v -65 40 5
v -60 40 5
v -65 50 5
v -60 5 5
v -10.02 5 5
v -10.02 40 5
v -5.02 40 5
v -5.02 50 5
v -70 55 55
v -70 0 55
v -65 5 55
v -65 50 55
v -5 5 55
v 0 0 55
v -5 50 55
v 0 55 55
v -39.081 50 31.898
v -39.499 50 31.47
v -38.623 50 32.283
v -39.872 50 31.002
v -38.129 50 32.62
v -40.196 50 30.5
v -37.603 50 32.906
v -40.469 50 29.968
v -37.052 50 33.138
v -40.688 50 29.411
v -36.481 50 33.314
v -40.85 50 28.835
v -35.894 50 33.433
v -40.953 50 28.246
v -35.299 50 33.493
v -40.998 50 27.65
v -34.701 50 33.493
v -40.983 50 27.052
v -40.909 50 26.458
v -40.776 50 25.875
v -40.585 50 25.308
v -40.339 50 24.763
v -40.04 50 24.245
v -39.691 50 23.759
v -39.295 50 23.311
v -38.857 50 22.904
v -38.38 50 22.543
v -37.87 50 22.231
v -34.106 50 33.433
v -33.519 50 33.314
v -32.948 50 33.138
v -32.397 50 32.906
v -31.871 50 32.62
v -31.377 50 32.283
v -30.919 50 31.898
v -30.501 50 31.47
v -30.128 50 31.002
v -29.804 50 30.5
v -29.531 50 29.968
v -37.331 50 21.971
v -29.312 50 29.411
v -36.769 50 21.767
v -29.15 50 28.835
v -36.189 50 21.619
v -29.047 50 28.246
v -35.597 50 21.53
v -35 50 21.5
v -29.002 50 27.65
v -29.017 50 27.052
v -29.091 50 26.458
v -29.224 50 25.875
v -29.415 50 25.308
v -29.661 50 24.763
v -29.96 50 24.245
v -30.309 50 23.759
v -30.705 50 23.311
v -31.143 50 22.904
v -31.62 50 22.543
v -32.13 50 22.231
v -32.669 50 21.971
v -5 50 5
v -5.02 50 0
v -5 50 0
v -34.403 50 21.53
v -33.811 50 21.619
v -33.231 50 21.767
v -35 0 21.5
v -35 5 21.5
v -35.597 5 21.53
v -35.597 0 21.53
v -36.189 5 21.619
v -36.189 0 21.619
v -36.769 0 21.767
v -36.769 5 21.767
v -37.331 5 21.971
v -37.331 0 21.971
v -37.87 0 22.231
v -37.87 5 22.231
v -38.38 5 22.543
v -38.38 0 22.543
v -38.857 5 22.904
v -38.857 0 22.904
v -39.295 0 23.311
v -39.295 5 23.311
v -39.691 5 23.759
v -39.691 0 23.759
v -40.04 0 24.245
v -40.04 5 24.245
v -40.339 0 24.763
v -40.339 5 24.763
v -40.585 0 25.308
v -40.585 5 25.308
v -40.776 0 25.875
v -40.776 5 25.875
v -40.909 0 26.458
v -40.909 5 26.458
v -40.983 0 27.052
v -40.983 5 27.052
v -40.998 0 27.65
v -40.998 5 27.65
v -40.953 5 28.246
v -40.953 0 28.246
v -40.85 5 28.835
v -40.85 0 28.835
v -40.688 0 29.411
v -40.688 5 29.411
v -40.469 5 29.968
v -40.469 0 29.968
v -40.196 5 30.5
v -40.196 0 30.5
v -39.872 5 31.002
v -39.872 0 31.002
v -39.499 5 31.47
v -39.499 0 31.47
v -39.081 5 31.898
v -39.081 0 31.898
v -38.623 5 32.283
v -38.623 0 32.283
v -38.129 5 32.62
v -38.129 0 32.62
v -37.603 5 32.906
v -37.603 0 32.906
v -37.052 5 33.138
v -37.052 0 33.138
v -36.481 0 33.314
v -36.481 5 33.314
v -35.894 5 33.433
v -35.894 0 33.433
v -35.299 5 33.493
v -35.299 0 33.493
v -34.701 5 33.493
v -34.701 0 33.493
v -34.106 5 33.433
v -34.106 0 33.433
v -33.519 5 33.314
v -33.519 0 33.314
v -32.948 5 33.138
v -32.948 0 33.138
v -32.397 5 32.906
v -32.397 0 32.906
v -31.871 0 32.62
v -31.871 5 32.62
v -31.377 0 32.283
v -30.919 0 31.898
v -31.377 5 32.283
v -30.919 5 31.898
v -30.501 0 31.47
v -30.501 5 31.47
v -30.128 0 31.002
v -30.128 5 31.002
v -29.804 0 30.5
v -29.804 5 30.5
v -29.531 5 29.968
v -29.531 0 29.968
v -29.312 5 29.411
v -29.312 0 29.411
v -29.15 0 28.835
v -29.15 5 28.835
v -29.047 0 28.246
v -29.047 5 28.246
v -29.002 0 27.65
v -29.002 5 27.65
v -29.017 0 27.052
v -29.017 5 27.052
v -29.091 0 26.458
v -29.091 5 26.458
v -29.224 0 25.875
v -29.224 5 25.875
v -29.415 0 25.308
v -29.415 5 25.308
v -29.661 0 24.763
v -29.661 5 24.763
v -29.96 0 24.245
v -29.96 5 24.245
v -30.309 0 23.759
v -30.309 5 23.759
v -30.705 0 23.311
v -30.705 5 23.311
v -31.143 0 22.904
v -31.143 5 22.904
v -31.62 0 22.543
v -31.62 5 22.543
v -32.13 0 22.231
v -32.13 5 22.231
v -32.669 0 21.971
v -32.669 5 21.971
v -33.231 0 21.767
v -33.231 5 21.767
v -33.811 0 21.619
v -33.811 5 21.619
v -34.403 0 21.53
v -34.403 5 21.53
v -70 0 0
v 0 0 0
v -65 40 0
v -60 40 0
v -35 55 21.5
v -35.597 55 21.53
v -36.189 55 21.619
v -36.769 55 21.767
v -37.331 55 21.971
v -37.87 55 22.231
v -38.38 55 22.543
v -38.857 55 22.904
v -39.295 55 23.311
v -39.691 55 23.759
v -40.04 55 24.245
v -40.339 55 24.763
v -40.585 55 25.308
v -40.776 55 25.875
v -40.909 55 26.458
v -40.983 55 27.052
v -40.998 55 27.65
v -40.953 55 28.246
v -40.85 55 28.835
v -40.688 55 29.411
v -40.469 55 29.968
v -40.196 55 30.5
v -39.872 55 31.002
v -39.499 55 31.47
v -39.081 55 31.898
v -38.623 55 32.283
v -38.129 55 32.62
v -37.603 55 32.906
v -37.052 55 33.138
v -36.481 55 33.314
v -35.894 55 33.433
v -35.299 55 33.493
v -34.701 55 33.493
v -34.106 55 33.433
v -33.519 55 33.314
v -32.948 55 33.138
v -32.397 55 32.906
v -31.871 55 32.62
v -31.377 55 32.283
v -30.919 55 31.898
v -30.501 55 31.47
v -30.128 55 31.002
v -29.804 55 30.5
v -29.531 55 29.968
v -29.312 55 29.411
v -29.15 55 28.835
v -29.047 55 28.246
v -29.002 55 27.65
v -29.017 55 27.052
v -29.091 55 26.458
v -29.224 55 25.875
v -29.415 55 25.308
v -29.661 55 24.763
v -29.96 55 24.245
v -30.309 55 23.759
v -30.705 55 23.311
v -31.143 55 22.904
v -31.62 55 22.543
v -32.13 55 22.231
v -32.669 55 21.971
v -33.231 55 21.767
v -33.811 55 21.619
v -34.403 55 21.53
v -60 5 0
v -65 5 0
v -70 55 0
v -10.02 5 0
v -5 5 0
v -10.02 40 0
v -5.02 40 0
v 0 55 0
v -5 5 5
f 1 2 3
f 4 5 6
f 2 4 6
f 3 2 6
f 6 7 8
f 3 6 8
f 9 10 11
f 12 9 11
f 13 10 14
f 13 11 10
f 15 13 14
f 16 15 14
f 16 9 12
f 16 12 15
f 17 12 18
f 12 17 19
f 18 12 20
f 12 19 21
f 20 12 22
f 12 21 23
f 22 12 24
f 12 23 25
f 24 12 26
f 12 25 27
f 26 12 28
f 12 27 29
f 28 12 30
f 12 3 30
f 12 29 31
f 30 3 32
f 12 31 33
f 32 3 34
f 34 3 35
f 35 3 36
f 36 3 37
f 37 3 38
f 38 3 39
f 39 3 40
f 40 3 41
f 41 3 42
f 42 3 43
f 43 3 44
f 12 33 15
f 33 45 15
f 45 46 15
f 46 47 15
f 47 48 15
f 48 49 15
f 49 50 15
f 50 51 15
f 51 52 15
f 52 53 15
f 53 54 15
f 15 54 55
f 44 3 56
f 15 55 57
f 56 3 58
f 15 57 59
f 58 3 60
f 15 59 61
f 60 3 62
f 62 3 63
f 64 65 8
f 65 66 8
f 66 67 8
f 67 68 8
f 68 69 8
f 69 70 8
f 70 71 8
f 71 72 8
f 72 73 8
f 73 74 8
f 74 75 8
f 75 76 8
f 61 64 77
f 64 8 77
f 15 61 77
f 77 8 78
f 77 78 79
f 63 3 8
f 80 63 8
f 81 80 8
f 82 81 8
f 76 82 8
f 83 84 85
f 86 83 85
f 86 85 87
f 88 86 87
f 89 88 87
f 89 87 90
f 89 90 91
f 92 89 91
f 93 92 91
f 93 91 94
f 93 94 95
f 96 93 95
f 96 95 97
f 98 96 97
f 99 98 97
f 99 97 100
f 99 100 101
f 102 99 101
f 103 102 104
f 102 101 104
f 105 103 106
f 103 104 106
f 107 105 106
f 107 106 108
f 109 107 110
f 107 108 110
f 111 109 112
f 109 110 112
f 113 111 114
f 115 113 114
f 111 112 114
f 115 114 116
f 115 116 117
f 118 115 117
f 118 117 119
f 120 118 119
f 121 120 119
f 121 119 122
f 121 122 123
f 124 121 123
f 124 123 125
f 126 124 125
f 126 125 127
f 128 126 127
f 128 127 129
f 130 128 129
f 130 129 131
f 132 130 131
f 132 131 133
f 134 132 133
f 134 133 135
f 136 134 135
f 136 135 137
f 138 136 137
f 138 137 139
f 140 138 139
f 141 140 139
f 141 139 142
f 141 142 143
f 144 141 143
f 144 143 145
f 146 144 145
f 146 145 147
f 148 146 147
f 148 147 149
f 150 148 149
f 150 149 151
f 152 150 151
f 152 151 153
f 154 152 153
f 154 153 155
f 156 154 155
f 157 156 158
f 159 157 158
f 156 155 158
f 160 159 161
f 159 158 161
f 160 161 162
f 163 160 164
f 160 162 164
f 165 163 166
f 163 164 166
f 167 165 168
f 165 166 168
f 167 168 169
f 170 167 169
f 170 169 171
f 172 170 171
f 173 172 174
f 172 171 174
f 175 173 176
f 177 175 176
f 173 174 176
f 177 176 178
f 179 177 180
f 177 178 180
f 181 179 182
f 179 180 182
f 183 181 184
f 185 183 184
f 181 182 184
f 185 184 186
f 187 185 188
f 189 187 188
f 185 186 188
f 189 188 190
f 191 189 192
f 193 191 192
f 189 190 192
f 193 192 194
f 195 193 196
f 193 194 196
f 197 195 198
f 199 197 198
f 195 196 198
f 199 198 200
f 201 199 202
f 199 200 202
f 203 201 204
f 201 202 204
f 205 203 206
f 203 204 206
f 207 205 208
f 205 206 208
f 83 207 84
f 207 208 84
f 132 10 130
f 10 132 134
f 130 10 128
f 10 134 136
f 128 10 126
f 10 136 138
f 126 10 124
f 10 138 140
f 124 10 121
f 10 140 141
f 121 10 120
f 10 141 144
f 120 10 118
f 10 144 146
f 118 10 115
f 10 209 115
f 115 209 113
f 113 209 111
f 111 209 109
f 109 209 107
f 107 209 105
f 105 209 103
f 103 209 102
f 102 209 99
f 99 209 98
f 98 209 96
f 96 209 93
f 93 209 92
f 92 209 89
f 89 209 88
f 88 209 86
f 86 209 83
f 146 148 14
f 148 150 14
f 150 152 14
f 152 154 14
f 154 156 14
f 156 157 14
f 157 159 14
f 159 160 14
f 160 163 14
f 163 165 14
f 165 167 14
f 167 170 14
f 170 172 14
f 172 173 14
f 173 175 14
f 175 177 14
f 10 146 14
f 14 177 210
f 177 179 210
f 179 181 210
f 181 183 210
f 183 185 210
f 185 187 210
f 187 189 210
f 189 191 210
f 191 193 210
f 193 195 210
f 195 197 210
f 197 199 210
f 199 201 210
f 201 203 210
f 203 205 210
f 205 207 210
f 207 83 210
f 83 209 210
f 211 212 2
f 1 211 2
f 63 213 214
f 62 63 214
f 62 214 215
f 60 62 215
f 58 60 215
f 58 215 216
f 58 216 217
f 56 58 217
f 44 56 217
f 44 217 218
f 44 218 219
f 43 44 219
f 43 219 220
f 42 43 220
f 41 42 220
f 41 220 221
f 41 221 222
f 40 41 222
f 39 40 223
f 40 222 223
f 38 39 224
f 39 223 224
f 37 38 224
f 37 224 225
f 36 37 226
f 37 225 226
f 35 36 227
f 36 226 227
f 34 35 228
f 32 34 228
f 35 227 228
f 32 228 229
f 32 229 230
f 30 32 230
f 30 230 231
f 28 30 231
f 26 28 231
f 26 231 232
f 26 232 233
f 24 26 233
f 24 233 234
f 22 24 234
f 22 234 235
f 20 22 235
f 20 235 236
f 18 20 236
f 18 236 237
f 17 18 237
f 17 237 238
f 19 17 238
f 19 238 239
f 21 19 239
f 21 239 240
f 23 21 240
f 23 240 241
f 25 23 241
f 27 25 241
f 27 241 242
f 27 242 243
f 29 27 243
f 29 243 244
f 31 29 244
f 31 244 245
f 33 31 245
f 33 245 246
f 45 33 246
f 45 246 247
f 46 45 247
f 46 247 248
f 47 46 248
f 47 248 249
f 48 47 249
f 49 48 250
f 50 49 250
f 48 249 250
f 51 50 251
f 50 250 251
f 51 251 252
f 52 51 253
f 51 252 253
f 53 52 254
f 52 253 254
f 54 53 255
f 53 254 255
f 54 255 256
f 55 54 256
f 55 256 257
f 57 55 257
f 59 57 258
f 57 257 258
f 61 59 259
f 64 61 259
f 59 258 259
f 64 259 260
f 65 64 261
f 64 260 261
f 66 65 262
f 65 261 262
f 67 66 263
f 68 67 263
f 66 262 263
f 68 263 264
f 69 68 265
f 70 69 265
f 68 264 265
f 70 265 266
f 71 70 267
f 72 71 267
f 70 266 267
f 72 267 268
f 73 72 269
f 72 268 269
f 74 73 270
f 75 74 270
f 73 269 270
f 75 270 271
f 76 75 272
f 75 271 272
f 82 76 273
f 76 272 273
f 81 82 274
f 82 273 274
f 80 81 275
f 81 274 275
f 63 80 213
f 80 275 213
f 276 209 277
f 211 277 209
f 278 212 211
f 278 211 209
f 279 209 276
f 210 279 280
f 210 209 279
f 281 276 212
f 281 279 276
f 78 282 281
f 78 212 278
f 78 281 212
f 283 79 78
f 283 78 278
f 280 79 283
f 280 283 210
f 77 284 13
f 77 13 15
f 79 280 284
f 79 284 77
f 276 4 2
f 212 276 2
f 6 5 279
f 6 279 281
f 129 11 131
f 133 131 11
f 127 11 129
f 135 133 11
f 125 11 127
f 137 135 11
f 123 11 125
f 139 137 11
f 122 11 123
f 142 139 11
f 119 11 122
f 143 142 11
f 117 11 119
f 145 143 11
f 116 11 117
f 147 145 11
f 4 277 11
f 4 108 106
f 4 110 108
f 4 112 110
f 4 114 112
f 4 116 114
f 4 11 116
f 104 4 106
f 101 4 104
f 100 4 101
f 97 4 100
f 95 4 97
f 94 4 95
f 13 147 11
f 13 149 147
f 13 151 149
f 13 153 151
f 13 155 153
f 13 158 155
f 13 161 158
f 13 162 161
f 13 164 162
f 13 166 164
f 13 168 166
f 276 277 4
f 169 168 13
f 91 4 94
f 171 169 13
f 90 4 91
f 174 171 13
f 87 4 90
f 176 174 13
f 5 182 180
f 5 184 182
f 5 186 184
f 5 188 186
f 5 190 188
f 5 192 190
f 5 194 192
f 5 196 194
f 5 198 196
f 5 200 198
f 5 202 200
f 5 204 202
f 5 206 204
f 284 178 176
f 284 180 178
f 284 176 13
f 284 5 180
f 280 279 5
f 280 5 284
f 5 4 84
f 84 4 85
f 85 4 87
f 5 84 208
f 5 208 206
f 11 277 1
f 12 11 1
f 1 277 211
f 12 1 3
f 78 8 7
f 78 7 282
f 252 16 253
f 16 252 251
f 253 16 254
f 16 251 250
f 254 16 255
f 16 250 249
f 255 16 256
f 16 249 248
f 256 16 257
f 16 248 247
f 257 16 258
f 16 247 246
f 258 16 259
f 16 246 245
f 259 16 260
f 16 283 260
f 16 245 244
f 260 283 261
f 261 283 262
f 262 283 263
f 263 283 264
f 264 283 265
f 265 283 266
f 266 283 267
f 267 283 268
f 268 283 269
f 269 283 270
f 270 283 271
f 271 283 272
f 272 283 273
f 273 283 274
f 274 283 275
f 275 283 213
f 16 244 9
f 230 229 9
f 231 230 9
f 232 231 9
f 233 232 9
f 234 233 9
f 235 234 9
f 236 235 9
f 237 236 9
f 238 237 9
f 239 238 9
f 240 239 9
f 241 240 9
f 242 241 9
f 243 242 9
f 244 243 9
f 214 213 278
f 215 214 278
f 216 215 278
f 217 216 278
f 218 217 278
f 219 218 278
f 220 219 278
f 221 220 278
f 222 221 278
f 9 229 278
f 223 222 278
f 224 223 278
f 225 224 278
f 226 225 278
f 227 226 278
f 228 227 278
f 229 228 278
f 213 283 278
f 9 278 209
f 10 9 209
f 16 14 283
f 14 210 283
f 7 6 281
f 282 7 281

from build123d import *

# Parameters (mm, degrees)
SKETCH1_W           = 70
SKETCH1_H           = 55
BOSS_EXTRUDE1_DEPTH = 5
SKETCH2_W           = 5
SKETCH2_H           = 45
SKETCH2_W_2         = 5.019591865
CUT_EXTRUDE1_DEPTH  = 5
SKETCH6_W           = 60
SKETCH6_H           = 45
BOSS_EXTRUDE4_DEPTH = 50
SKETCH7_R           = 6
CUT_EXTRUDE2_DEPTH  = 70
SKETCH8_W           = 5
SKETCH8_H           = 10
BOSS_EXTRUDE5_DEPTH = 5
SKETCH9_W           = 5
SKETCH9_H           = 10
BOSS_EXTRUDE6_DEPTH = 5


with BuildPart() as part:
    # Sketch1 → Boss-Extrude1 (new body)
    with BuildSketch(Plane.XY):
        with Locations((-35, 27.5)):
            Rectangle(SKETCH1_W, SKETCH1_H)
    extrude(amount=BOSS_EXTRUDE1_DEPTH)

    # Sketch2 → Cut-Extrude1 (cut)
    with BuildSketch(Plane.XY.offset(5)):
        with Locations((-62.5, 27.5)):
            Rectangle(SKETCH2_W, SKETCH2_H)
        with Locations((-7.509795933, 27.5)):
            Rectangle(SKETCH2_W_2, SKETCH2_H)
    extrude(amount=-CUT_EXTRUDE1_DEPTH, mode=Mode.SUBTRACT)

    # Sketch6 → Boss-Extrude4 (add)
    with BuildSketch(Plane.XY.offset(5)):
        Polygon((-70, 0), (-65, 0), (-5, 0), (0, 0), (0, 55), (-5, 55), (-65, 55), (-70, 55), align=None)
        with Locations((-35, 27.5)):
            Rectangle(SKETCH6_W, SKETCH6_H, mode=Mode.SUBTRACT)
    extrude(amount=BOSS_EXTRUDE4_DEPTH)

    # Sketch7 → Cut-Extrude2 (cut)
    with BuildSketch(Plane(origin=(0, 55, 0), x_dir=(1, 0, 0), z_dir=(0, 1, 0))):
        with Locations(Location((-35, -27.5, 0), (0, 0, 90))):
            Circle(SKETCH7_R)
    extrude(amount=-CUT_EXTRUDE2_DEPTH, mode=Mode.SUBTRACT)

    # Sketch8 → Boss-Extrude5 (add)
    with BuildSketch(Plane(origin=(-10.019591865, 0, 0), x_dir=(0, 0, -1), z_dir=(1, 0, 0))):
        with Locations((-2.5, 45)):
            Rectangle(SKETCH8_W, SKETCH8_H)
    extrude(amount=BOSS_EXTRUDE5_DEPTH)

    # Sketch9 → Boss-Extrude6 (add)
    with BuildSketch(Plane.ZY.offset(60)):
        with Locations((2.5, 45)):
            Rectangle(SKETCH9_W, SKETCH9_H)
    extrude(amount=BOSS_EXTRUDE6_DEPTH)


solid = part.part
